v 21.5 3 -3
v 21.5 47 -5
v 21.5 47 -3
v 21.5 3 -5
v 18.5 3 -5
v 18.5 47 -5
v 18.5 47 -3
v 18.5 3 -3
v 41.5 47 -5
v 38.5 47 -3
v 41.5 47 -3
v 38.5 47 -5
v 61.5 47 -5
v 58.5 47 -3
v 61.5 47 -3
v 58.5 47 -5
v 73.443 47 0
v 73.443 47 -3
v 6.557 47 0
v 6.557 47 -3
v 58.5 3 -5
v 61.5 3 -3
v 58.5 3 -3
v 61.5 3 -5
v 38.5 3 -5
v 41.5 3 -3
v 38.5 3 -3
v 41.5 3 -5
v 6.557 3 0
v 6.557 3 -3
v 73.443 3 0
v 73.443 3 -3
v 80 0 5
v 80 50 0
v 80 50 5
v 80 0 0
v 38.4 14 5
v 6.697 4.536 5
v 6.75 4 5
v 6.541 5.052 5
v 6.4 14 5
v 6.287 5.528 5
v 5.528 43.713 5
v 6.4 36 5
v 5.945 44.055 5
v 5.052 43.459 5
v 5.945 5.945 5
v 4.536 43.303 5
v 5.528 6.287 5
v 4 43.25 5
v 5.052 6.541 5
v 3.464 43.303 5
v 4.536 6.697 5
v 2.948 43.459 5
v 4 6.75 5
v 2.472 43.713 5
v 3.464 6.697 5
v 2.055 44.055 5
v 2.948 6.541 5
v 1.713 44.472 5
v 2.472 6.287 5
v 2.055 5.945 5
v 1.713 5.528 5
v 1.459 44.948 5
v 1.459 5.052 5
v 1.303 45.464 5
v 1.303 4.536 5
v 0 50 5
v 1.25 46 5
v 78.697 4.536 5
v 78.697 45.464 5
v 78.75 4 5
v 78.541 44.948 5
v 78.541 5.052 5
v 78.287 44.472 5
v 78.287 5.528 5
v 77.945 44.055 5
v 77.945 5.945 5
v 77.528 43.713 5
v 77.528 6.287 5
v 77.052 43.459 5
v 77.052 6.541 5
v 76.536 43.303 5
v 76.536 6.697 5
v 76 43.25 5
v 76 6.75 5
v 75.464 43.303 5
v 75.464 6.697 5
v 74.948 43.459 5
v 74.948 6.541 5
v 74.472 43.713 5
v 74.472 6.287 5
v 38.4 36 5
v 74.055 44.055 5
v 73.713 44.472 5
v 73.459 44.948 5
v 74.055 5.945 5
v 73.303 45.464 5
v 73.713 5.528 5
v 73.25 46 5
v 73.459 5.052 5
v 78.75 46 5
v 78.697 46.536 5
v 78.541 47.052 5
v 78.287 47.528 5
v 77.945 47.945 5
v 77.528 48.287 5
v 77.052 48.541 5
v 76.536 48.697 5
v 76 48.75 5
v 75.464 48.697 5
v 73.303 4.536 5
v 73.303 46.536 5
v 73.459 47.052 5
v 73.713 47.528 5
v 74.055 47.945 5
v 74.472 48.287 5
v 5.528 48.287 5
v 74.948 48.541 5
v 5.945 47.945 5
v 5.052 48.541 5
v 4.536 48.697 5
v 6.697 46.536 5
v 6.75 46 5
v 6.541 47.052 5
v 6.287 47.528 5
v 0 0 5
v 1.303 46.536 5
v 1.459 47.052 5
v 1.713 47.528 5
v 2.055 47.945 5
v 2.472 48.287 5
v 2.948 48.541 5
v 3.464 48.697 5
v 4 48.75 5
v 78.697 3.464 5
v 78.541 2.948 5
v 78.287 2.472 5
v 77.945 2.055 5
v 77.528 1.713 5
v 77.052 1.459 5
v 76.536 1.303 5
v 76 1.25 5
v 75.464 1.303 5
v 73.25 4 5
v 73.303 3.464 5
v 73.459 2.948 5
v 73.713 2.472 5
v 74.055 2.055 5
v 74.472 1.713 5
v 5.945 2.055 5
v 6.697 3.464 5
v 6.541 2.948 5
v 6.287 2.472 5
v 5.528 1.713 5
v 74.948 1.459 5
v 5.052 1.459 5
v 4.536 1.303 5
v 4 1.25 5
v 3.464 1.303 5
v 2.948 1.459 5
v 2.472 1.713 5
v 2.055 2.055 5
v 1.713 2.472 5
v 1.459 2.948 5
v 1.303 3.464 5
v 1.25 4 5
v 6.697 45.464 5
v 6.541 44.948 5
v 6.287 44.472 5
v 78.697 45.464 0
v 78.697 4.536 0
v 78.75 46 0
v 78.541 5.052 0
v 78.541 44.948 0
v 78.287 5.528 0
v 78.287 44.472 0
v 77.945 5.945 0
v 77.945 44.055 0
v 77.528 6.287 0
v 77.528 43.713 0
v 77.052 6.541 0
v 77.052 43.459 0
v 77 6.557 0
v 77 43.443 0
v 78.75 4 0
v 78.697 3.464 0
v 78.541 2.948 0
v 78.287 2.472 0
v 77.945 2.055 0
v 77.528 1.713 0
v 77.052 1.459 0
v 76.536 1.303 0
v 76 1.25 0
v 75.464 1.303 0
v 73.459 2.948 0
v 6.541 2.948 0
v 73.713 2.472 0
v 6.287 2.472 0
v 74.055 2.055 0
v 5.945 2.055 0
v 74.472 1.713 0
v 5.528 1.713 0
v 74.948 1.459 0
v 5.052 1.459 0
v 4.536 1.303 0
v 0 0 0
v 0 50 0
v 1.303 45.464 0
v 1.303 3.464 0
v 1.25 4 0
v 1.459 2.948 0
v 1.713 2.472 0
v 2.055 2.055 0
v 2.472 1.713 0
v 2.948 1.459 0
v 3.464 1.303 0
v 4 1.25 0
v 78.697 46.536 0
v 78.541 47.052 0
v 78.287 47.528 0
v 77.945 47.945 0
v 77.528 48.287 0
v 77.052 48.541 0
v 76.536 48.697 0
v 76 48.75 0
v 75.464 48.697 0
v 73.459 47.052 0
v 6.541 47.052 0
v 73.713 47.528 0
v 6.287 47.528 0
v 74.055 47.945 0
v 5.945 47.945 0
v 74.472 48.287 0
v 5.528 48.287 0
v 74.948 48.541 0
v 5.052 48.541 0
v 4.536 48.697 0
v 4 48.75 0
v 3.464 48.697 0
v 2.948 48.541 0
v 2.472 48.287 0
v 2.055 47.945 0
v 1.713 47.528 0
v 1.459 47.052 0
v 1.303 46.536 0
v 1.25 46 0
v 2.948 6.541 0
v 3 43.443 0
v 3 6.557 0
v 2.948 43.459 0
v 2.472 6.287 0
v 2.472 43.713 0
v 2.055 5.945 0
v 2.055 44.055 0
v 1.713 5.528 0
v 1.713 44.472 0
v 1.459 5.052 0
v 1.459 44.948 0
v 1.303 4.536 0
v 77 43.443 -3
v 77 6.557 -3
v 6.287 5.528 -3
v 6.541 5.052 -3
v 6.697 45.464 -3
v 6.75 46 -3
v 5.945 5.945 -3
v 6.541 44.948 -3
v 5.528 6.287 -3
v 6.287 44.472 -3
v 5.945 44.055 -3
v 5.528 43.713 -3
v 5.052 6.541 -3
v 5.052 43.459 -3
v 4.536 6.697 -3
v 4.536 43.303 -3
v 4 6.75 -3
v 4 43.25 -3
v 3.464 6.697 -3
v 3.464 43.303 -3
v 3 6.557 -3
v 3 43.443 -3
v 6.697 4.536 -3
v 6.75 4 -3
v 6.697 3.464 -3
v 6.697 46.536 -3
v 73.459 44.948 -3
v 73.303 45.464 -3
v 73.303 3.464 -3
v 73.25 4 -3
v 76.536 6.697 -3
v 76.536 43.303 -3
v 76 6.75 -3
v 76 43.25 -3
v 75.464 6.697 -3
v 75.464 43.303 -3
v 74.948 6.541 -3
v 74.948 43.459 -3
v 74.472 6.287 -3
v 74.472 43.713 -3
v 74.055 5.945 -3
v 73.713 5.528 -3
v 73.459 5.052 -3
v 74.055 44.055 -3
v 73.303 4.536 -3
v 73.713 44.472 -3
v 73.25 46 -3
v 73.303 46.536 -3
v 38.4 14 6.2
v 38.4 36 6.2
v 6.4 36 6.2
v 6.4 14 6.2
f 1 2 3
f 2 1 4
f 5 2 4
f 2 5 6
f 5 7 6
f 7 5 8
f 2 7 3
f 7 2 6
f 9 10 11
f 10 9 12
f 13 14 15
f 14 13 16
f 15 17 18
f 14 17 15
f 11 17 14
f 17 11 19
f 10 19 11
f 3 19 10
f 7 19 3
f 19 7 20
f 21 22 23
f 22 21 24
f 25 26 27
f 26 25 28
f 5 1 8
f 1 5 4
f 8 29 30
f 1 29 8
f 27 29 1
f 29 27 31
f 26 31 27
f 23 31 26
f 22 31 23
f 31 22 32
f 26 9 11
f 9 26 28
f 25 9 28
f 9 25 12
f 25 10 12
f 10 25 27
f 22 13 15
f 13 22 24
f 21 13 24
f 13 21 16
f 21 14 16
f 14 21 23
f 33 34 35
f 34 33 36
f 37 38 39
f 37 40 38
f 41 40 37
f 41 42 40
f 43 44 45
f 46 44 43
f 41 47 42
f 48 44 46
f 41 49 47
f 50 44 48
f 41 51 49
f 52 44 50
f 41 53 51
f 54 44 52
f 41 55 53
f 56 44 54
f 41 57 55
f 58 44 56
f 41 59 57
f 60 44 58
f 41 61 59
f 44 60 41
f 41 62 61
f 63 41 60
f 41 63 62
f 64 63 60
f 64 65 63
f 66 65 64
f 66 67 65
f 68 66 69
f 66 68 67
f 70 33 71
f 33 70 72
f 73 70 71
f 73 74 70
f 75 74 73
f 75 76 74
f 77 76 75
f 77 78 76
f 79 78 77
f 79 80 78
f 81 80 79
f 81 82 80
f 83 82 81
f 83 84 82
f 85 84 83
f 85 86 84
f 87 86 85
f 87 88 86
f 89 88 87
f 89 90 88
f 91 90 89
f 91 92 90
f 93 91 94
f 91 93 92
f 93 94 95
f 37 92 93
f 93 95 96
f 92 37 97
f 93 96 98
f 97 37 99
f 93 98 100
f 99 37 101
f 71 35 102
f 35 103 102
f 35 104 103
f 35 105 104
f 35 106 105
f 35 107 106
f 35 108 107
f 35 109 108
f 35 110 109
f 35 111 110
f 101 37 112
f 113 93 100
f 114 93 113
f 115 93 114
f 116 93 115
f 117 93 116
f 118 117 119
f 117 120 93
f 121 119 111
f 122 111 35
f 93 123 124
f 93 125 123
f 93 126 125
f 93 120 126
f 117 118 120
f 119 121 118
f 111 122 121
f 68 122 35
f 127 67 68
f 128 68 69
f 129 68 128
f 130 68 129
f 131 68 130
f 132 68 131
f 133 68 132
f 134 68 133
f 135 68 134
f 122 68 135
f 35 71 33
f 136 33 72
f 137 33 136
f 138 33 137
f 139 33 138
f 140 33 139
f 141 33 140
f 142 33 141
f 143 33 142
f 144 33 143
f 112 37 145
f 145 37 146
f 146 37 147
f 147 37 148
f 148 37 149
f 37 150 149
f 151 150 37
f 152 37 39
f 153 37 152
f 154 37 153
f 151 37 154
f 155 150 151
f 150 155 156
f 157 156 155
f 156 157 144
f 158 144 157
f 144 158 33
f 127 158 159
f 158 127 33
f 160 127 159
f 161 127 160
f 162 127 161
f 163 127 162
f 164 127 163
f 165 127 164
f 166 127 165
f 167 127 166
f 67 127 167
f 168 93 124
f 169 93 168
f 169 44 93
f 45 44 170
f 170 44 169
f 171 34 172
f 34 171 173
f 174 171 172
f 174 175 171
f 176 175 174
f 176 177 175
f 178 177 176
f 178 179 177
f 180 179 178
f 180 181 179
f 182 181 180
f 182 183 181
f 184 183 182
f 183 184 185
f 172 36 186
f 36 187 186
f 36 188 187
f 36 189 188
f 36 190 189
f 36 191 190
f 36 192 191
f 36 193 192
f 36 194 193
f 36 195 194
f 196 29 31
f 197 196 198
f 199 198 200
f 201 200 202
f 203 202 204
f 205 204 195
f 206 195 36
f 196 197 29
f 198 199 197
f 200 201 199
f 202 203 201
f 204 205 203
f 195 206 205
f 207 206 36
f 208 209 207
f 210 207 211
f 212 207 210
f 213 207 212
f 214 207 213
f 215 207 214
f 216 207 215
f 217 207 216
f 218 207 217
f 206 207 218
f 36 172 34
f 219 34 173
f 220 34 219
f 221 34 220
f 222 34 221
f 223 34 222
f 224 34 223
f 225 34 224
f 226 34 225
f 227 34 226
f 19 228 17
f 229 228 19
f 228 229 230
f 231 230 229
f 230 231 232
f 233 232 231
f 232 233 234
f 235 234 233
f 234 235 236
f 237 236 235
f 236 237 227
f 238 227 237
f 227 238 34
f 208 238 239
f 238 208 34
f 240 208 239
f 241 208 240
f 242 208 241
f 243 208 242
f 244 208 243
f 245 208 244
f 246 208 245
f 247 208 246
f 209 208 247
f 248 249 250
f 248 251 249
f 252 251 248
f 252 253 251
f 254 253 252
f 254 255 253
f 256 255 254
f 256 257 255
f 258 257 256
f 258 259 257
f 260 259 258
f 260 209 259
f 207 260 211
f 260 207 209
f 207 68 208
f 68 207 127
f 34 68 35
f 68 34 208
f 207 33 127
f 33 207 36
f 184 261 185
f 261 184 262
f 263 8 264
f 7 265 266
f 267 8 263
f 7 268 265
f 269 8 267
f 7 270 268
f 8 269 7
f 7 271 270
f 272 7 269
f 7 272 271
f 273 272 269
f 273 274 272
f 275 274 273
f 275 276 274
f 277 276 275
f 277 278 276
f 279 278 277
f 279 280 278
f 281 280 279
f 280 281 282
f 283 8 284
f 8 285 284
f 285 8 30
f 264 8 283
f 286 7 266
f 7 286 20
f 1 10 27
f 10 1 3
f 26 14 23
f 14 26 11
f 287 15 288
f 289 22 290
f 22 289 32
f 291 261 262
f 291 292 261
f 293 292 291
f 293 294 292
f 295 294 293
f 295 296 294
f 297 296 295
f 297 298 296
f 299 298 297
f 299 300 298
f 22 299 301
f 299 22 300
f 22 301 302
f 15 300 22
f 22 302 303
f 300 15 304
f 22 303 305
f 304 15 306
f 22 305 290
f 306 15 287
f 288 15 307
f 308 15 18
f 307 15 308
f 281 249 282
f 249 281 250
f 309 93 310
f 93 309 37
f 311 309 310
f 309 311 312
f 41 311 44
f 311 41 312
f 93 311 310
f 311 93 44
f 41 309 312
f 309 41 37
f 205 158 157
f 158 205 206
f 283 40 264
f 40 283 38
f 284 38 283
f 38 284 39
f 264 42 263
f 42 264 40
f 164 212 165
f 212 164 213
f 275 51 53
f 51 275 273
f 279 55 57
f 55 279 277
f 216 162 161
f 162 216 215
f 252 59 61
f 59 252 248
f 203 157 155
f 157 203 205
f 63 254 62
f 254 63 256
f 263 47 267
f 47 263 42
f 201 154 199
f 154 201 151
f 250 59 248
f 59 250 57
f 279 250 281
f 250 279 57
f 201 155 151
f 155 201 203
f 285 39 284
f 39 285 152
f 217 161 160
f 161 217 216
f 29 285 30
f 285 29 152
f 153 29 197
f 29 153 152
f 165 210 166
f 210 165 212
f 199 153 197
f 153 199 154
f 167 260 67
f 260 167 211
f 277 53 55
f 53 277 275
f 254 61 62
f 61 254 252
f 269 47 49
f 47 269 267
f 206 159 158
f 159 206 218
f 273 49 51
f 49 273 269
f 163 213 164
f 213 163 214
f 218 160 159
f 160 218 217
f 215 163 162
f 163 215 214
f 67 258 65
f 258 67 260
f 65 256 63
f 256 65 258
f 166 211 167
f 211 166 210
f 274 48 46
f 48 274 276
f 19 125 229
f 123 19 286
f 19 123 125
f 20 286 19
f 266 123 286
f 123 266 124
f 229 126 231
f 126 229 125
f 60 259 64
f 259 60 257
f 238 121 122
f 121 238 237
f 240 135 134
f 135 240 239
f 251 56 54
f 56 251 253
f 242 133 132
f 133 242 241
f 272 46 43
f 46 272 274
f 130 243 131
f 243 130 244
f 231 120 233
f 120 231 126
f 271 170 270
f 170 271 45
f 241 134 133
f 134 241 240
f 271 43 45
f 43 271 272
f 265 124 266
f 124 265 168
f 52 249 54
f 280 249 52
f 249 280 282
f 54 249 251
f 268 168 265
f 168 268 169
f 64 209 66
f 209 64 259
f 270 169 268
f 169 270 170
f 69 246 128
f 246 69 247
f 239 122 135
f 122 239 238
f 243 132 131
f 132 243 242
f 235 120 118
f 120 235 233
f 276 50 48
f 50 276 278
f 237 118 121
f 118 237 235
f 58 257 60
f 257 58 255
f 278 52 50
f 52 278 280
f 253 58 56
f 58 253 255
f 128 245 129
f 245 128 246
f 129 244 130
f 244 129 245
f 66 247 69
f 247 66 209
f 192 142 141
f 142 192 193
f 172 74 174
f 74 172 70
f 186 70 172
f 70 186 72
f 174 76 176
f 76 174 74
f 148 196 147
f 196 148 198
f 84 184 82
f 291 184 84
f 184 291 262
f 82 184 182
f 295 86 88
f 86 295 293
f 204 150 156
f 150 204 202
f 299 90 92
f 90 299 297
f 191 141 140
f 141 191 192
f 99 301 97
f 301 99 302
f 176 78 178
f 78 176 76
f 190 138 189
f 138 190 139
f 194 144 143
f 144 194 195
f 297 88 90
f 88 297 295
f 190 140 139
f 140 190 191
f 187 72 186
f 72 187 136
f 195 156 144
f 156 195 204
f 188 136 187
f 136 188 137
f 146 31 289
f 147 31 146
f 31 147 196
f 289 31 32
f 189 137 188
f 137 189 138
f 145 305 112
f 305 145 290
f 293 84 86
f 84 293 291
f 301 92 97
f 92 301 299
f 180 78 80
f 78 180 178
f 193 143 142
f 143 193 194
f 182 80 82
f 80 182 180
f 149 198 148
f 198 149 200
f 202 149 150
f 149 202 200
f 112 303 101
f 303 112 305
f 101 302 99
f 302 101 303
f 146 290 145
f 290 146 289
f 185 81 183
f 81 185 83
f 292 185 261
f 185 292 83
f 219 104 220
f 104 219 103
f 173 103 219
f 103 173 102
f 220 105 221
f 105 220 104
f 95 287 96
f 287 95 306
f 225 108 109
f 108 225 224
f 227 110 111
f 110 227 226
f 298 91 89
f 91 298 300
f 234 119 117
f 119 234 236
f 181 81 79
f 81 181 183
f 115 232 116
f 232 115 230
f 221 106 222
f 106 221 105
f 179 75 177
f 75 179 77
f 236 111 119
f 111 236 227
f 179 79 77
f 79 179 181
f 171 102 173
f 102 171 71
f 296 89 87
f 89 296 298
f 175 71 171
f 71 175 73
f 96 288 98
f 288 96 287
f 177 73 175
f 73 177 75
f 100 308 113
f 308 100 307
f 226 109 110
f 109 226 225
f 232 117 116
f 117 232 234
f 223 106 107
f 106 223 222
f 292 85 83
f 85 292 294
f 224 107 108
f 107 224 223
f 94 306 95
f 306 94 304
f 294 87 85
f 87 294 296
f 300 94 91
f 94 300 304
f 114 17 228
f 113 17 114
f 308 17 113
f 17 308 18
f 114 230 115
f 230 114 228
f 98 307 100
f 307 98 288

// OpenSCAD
$fn = 32;

// ----------------------------------------------------------------------
// Enclosure lid: 80 x 50 x 5 mm, 4 bolt holes
// ----------------------------------------------------------------------

// --- parameters (mm) ---
length = 80;              // lid length, X
width = 50;               // lid width, Y
plate_t = 5;              // lid plate thickness
bolt_d = 5.5;             // bolt clearance
boss_lip = 4;             // bolt hole inset from the corner
sink = 1;                 // overlap of the lip and ribs into the plate
lip_h = 4;                // lip height below the plate
lip_wall = 3;             // lip wall thickness
rib_n = 3;                // stiffening ribs
rib_t = 3;                // rib thickness
rib_h = 6;                // rib height below the plate
label_h = 1.2;            // raised marking pad

module plate() {
  cube([length, width, plate_t]);
  /* lip that drops into the housing opening, sunk into the plate */
  translate([lip_wall, lip_wall, -lip_h + sink]) cube([length - 2 * lip_wall, width - 2 * lip_wall, lip_h]);
  /* stiffening ribs under the plate */
  for (i = [1 : rib_n]) translate([length * i / (rib_n + 1) - rib_t / 2, lip_wall, -rib_h + sink]) cube([rib_t, width - 2 * lip_wall, rib_h]);
  /* raised marking pad on top, sunk 1 mm into the plate */
  translate([length * 0.08, width * 0.28, plate_t - 1]) cube([length * 0.4, width * 0.44, label_h + 1]);
}

difference() {
  plate();
  /* bolt pattern matching the corner bosses */
  for (sx = [0, 1]) for (sy = [0, 1])
    translate([sx * (length - 2 * boss_lip) + boss_lip, sy * (width - 2 * boss_lip) + boss_lip, -lip_h - 1])
      cylinder(h = plate_t + lip_h + 2, d = bolt_d);
}
